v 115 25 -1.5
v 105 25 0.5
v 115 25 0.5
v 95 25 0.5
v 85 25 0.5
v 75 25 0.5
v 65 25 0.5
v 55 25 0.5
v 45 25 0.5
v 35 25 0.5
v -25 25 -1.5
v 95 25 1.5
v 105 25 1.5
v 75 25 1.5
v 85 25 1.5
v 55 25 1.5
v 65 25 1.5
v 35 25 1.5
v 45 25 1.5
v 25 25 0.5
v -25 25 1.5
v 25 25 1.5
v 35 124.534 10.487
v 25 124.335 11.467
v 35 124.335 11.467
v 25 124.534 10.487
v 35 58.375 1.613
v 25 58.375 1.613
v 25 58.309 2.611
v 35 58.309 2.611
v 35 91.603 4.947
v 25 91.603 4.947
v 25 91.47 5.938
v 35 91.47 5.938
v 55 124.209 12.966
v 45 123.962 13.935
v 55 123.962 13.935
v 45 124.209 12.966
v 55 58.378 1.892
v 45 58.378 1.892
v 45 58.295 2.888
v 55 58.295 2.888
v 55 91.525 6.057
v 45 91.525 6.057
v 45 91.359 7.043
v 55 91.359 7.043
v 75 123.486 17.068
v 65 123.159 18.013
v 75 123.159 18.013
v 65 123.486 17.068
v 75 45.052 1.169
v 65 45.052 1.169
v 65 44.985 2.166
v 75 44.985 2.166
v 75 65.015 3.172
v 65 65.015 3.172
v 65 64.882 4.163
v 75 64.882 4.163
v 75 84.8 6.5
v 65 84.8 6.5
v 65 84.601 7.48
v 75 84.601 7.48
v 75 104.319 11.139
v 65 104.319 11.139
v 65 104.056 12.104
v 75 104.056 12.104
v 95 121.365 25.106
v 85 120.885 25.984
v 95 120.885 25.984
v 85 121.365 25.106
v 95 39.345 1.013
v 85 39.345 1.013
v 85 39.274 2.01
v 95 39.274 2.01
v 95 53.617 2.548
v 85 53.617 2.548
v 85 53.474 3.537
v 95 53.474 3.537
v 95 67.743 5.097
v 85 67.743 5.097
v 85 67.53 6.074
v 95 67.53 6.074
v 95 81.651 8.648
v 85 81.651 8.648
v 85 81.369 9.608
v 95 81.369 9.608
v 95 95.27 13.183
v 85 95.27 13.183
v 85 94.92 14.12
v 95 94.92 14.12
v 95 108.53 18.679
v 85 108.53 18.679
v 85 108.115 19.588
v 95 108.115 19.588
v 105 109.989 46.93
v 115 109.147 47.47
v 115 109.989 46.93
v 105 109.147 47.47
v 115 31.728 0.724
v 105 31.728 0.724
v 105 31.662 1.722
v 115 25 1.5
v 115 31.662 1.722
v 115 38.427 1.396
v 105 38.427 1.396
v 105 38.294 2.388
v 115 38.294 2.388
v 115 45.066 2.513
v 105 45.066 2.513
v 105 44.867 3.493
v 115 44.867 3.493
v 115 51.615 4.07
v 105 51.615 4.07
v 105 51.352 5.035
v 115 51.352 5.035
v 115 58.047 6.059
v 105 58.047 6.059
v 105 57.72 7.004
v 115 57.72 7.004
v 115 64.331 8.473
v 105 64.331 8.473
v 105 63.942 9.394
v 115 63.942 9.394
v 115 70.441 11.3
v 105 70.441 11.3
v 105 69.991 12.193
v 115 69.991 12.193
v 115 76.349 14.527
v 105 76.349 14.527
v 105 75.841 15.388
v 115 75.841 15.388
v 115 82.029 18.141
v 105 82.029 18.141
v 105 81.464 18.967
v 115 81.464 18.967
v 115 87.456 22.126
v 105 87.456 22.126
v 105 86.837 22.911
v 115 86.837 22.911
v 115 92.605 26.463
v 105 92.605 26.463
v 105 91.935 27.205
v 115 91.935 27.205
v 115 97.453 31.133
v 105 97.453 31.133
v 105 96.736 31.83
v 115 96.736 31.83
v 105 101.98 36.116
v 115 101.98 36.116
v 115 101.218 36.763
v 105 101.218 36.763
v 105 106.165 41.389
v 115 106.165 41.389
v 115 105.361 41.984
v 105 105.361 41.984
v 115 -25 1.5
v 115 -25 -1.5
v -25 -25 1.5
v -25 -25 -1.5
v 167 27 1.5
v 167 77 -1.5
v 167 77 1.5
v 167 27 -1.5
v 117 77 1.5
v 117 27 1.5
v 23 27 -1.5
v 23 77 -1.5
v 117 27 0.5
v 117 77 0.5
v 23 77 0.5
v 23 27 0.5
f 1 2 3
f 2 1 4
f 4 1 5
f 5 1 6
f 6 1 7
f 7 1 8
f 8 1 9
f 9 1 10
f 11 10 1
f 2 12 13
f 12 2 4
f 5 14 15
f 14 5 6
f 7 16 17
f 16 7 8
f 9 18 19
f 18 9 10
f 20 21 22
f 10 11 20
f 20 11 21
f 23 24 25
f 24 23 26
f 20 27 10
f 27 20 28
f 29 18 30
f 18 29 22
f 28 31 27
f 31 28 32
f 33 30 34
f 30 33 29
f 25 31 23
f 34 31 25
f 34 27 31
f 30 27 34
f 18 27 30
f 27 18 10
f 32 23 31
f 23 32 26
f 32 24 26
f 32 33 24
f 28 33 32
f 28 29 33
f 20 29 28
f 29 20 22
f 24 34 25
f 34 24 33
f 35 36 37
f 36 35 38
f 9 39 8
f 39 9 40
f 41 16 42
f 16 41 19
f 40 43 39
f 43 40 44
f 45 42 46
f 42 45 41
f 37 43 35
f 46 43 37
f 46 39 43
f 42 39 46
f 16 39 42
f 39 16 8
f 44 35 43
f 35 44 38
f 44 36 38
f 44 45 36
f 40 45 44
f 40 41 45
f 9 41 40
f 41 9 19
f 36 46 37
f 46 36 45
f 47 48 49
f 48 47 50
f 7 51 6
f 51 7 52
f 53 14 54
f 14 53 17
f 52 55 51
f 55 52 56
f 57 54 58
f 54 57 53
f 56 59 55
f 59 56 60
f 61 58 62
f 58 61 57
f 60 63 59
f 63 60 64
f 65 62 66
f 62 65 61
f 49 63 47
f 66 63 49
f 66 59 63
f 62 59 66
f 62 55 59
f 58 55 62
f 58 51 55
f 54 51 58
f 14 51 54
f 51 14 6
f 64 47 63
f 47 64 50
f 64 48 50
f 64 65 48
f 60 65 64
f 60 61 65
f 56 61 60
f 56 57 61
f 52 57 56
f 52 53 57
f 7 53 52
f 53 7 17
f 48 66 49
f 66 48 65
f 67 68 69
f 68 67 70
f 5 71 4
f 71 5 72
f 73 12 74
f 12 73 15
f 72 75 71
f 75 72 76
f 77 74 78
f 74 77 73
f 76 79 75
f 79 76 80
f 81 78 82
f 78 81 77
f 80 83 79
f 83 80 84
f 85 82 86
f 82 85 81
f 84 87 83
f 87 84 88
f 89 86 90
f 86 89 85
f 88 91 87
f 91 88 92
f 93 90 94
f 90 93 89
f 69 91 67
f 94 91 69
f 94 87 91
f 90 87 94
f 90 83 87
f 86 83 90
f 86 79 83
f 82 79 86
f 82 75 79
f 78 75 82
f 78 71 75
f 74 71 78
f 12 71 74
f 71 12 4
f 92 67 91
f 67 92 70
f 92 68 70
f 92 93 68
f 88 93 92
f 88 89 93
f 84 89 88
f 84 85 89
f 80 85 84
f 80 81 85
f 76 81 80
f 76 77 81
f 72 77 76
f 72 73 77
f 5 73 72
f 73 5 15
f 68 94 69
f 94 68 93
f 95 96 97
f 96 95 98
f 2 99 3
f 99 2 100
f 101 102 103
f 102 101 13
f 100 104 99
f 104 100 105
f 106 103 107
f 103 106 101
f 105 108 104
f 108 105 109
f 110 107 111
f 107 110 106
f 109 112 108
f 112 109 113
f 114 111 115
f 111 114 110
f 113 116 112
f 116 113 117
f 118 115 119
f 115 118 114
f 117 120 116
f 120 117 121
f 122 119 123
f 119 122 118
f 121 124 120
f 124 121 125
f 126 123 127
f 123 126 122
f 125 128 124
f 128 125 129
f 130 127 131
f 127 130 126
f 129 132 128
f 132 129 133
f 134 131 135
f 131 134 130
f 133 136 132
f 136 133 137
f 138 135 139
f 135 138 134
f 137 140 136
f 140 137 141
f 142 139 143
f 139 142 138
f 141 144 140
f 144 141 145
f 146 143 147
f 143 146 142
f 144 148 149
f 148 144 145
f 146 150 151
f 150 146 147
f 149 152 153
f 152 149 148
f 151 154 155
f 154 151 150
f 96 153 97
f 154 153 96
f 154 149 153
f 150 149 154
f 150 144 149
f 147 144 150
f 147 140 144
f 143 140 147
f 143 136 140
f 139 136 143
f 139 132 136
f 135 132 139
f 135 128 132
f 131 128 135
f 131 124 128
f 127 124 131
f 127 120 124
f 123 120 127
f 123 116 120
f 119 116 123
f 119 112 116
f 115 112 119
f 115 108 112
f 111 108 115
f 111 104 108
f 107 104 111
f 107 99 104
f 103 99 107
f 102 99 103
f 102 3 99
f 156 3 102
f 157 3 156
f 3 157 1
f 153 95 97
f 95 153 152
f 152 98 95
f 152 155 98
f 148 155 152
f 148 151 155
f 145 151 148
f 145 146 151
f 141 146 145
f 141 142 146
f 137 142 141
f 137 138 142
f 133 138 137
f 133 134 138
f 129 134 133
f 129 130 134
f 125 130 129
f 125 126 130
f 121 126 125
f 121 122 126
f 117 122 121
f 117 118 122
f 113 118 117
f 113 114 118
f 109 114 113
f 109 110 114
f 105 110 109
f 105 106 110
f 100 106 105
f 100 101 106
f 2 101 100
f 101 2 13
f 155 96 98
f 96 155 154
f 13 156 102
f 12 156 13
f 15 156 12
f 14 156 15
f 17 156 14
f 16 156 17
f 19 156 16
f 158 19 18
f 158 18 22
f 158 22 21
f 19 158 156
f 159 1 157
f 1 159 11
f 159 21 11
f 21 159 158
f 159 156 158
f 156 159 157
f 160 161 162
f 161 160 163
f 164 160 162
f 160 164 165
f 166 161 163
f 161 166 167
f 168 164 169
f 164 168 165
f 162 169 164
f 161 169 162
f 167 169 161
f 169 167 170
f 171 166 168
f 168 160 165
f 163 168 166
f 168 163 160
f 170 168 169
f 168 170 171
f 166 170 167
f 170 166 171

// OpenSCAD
platewidth=50;
platelength=platewidth;
t_plate= 3;
baselength=90;
R = 4;
arclength=100;
t_base=2;




cube([platewidth, platelength, t_plate], center=true);// electrode 1

translate([platelength+baselength+2,platewidth+2,0])
cube([platewidth, platelength, t_plate], center=true);// electrode 2

translate([0.5*platewidth-2, 0.5*platewidth +2, -0.5*t_plate])
cube([94,50,t_base]);




translate([0.5*platelength, -0.5*platelength,-0.5*t_plate])
rotate([90,0,90])
linear_extrude(height=baselength,convexity=10)
square([platewidth,t_plate]);

module beams(arclength){
    for( i =[0:1:4]){
     
       
        R=500-100*i;
        theta= 57.296*arclength/R;
     
        translate([-R-0.5*t_plate,0.5*platewidth,0.5*platewidth+20*i])
        
        rotate_extrude(angle=theta, $fn=100)
        {
            translate([R,0,0])
            square([1,10]);
            
            
        }
    }
        
}

rotate([90,90,90])
beams(arclength);
